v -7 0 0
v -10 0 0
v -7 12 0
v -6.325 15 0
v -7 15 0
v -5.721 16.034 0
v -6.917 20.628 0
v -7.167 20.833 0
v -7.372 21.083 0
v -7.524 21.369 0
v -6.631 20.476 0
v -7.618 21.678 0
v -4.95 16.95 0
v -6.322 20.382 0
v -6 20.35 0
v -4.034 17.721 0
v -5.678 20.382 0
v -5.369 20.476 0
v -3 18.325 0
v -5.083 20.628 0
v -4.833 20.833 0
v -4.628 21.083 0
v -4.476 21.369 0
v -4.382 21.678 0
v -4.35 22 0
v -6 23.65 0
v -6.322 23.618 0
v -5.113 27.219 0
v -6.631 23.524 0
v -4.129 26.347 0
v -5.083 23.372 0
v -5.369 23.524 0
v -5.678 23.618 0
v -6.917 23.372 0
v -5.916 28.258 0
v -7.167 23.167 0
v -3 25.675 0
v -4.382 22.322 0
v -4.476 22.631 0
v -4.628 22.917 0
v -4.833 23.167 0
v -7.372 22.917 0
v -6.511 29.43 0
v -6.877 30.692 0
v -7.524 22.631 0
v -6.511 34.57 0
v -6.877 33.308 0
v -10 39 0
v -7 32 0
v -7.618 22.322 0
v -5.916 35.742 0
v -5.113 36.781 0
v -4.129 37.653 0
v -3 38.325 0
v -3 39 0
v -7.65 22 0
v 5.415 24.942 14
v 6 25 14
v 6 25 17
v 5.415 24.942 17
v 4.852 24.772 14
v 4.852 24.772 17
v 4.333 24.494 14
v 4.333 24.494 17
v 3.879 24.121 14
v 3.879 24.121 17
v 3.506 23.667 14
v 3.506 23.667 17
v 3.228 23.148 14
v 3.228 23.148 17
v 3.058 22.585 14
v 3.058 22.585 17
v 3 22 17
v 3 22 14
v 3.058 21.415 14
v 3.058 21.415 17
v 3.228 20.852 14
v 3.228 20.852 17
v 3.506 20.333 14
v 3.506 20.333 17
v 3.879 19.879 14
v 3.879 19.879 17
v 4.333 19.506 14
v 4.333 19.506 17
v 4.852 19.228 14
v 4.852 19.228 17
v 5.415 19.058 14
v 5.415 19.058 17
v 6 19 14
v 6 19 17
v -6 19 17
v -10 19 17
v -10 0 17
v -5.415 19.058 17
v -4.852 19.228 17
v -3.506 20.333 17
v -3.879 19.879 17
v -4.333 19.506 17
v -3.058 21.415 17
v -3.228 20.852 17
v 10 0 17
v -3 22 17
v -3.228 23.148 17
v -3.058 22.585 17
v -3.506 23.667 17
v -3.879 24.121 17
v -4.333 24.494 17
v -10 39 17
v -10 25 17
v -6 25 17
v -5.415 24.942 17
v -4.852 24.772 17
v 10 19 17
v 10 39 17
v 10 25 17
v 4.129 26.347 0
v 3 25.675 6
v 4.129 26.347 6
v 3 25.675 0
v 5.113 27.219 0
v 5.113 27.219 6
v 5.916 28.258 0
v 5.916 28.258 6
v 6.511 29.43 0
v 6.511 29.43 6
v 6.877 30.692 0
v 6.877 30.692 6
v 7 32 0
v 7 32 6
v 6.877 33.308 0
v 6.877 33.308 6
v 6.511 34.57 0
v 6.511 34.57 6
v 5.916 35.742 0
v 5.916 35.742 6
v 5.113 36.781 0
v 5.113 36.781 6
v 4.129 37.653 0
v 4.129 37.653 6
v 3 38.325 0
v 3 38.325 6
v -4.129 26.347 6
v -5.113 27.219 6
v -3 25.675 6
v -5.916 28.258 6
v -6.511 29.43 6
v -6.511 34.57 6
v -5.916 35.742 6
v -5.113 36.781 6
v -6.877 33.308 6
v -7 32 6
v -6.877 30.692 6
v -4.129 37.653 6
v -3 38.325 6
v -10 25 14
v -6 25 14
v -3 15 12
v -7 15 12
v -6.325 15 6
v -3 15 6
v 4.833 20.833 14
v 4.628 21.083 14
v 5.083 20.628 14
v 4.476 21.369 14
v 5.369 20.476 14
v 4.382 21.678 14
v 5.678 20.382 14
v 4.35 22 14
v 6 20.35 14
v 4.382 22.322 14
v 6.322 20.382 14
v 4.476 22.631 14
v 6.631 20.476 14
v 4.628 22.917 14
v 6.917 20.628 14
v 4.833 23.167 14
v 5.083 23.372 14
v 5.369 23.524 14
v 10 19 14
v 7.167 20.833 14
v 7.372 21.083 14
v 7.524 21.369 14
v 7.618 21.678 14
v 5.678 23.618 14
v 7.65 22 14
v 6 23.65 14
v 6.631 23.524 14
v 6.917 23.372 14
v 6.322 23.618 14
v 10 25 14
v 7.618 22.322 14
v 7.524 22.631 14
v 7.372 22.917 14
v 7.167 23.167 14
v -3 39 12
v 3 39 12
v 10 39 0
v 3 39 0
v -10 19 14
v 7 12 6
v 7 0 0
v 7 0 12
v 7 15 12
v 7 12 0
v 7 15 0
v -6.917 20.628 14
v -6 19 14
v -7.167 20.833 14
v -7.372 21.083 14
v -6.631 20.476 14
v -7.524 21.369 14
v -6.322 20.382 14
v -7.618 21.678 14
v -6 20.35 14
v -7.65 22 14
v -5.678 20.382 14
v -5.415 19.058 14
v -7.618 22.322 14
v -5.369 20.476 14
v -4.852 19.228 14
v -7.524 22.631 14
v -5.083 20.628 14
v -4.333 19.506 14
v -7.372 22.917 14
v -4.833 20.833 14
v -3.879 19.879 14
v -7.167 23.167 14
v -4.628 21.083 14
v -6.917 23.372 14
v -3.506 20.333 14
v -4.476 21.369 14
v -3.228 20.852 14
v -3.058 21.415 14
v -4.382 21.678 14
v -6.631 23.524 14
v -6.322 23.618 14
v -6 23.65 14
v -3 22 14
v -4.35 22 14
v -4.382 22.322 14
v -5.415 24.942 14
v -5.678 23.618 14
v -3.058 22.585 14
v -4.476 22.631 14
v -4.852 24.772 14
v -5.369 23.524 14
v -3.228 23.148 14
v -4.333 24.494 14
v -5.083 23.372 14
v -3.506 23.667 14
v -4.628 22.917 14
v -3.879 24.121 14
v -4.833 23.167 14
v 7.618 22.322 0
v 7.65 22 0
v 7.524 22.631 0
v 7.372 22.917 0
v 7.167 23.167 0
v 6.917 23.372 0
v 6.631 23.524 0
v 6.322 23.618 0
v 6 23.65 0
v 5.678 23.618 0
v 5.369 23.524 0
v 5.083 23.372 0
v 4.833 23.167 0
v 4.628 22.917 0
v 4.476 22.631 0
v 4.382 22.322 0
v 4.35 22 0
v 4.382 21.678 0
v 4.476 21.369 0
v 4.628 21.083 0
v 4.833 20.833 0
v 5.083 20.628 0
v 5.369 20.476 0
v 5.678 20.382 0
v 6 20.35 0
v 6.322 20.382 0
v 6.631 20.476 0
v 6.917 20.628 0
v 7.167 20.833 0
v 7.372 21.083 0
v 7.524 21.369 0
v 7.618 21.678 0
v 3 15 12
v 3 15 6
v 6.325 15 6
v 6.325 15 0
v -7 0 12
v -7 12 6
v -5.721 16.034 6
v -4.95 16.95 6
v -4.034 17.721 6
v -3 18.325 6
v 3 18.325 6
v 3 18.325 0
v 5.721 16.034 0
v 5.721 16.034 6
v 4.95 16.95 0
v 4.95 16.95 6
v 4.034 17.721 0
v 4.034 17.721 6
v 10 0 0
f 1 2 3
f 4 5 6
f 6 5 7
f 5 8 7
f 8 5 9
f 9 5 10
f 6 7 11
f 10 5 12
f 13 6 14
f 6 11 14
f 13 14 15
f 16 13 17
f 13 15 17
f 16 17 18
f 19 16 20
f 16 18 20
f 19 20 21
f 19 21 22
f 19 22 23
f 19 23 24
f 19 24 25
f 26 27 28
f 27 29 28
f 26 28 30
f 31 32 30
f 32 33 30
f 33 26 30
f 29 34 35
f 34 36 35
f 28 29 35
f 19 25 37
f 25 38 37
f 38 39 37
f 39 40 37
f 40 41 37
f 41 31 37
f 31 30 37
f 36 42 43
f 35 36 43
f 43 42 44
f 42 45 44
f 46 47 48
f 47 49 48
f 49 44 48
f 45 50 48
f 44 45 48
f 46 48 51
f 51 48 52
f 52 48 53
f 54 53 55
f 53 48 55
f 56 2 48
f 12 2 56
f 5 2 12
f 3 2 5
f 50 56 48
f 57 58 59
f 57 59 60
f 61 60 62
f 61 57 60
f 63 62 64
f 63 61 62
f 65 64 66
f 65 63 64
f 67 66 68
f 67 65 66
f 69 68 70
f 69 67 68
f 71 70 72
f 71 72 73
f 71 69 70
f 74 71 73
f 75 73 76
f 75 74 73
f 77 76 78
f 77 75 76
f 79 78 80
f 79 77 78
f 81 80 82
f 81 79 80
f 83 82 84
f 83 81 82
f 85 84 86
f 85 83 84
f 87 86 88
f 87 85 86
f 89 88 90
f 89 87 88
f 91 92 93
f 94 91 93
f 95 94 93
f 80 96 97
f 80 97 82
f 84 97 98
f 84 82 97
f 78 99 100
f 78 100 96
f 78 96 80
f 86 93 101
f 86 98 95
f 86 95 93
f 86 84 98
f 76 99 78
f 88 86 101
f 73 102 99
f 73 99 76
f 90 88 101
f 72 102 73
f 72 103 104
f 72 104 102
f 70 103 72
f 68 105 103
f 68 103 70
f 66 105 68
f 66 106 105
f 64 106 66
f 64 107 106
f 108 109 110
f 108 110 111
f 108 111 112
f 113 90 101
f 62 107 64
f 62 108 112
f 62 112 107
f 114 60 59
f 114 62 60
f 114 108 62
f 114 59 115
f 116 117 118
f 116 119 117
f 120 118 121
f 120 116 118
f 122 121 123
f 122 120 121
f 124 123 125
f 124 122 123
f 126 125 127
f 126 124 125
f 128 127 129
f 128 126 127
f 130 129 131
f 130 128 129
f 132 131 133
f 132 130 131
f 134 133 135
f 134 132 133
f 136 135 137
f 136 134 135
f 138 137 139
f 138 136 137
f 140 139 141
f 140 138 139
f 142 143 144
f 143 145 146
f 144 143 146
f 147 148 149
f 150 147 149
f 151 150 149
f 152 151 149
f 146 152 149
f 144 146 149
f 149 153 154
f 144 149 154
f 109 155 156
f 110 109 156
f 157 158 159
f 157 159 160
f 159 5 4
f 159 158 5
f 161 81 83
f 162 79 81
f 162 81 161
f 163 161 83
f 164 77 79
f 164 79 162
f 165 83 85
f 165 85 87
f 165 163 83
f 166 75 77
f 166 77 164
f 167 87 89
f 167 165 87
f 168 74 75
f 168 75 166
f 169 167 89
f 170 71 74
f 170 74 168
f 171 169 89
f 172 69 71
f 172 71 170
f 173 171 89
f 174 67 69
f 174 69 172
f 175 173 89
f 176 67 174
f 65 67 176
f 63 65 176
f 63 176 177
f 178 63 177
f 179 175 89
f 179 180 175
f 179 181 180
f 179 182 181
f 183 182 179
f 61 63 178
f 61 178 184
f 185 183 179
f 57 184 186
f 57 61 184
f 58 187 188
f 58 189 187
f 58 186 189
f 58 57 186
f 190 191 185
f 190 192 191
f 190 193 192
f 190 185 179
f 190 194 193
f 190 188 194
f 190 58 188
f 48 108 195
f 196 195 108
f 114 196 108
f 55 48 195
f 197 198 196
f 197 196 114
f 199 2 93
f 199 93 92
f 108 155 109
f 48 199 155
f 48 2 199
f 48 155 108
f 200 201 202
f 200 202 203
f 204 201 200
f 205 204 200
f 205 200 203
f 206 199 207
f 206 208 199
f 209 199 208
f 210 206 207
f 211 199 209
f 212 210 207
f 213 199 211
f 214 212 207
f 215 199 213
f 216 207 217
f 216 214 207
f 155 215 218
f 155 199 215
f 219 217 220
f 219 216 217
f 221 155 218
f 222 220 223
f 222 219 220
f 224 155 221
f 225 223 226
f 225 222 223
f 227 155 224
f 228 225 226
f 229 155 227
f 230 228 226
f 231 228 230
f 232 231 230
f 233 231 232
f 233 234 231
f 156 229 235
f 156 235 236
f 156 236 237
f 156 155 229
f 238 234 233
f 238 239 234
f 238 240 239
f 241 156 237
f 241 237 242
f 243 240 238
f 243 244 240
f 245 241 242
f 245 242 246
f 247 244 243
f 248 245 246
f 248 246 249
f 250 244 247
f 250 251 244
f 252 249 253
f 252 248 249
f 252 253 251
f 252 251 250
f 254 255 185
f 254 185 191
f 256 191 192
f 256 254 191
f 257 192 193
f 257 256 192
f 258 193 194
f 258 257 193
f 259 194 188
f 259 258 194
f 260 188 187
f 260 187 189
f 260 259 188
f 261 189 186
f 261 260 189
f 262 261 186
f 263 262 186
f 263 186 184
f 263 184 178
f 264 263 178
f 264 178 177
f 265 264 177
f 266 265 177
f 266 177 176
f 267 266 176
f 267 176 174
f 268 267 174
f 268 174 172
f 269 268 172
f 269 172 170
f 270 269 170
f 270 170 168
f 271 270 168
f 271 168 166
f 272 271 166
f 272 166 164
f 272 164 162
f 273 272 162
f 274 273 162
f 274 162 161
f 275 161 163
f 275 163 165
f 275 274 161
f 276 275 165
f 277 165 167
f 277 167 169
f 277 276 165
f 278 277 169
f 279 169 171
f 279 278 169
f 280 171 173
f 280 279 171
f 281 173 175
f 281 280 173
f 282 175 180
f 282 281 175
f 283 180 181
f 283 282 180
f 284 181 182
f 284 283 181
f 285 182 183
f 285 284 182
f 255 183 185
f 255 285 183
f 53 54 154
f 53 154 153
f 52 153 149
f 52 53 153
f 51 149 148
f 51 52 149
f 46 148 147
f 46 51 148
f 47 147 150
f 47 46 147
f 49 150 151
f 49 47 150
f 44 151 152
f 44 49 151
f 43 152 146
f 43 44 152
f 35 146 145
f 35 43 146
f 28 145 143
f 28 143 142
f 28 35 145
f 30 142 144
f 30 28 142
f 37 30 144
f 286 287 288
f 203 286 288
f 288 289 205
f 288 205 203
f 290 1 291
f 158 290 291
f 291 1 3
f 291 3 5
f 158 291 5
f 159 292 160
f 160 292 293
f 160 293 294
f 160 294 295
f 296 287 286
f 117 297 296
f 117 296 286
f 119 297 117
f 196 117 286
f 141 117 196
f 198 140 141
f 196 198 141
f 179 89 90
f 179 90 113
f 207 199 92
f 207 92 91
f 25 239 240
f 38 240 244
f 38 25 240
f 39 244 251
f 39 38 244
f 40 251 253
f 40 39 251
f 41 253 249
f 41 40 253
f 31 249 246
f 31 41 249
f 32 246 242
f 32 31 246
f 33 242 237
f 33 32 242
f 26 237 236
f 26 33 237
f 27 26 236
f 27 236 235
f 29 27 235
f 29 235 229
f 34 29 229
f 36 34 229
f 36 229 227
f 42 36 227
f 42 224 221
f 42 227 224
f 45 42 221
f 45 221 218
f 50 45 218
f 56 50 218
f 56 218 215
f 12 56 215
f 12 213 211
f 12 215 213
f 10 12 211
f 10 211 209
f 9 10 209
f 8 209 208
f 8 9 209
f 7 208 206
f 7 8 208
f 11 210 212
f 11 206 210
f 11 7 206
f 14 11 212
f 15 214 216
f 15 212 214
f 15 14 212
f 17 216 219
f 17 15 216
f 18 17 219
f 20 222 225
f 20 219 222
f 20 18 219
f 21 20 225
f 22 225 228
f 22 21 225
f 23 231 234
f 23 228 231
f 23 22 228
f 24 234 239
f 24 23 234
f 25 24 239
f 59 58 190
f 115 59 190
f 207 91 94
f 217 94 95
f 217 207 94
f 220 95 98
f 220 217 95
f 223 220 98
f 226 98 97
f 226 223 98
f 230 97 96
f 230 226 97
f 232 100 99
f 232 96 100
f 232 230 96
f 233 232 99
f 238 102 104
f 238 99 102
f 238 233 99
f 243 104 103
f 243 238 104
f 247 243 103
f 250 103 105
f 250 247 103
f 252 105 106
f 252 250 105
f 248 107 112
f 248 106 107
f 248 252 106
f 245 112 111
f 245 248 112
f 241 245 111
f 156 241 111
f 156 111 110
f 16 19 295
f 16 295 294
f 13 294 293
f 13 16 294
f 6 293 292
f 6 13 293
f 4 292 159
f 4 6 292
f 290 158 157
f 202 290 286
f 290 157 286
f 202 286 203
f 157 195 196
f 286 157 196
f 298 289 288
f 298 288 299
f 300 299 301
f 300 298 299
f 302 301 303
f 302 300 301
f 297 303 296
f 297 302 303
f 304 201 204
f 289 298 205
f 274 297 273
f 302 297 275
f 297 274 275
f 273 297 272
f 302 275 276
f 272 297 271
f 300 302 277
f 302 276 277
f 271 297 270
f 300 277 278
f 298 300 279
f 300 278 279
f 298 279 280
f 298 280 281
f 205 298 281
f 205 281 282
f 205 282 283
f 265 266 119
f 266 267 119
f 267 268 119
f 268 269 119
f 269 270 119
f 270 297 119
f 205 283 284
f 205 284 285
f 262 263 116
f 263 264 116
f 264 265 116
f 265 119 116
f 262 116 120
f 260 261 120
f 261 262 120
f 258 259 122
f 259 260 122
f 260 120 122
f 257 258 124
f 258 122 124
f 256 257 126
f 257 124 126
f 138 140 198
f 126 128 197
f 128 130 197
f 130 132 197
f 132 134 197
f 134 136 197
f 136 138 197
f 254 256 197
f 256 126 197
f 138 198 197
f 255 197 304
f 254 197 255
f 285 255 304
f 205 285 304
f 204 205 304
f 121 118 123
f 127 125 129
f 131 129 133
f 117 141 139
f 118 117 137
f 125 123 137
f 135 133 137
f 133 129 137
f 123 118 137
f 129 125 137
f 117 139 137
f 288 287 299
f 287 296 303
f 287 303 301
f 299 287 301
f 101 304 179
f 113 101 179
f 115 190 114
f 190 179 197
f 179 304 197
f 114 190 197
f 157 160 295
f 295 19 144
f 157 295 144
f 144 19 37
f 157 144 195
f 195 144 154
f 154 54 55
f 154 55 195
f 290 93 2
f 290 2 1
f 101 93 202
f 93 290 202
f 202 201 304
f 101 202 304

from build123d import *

# Parameters (mm, degrees)
CYLINDER005_R     = 3
CYLINDER005_DEPTH = 3
CYLINDER006_R     = 3
CYLINDER006_DEPTH = 3
BOX004_W          = 10
BOX004_H          = 6
BOX004_DEPTH      = 10
BOX005_W          = 10
BOX005_H          = 6
BOX005_DEPTH      = 10
CYLINDER010_R     = 1.65
CYLINDER010_DEPTH = 42
CYLINDER009_R     = 1.65
CYLINDER009_DEPTH = 42
BOX006_W          = 6
BOX006_H          = 32
BOX006_DEPTH      = 12
CYLINDER007_R     = 7
CYLINDER007_DEPTH = 6
CYLINDER008_R     = 7
CYLINDER008_DEPTH = 6
BOX001_W          = 20
BOX001_H          = 24
BOX001_DEPTH      = 17
BOX_W             = 20
BOX_H             = 15
BOX_DEPTH         = 5
BOX003_W          = 3
BOX003_H          = 39
BOX003_DEPTH      = 17
BOX007_W          = 3
BOX007_H          = 39
BOX007_DEPTH      = 17


with BuildPart() as cylinder005:
    # Cylinder005 → Cylinder005 (new body)
    with BuildSketch(Plane(origin=(6, 22, 0), x_dir=(1, 0, 0), z_dir=(0, 0, 1))):
        Circle(CYLINDER005_R)
    extrude(amount=CYLINDER005_DEPTH)


with BuildPart() as fusion001001001004:
    # Cylinder006 → Cylinder006 (new body)
    with BuildSketch(Plane(origin=(-6, 22, 0), x_dir=(1, 0, 0), z_dir=(0, 0, 1))):
        Circle(CYLINDER006_R)
    extrude(amount=CYLINDER006_DEPTH)

    # Fusion001001001004: union Cylinder005
    add(cylinder005.part)


with BuildPart() as fusion001001001004_1:
    # Fusion001001001004 placement: moved
    add(fusion001001001004.part.moved(Location((0, 0, 14))))


with BuildPart() as cube004:
    # Box004 → Box004 (new body)
    with BuildSketch(Plane(origin=(6, 19, 14), x_dir=(1, 0, 0), z_dir=(0, 0, 1))):
        with Locations((5, 3)):
            Rectangle(BOX004_W, BOX004_H)
    extrude(amount=BOX004_DEPTH)


with BuildPart() as fusion001001001005:
    # Box005 → Box005 (new body)
    with BuildSketch(Plane(origin=(-16, 19, 14), x_dir=(1, 0, 0), z_dir=(0, 0, 1))):
        with Locations((5, 3)):
            Rectangle(BOX005_W, BOX005_H)
    extrude(amount=BOX005_DEPTH)

    # Fusion001001001005: union Cube004
    add(cube004.part)


with BuildPart() as cylinder010:
    # Cylinder010 → Cylinder010 (new body)
    with BuildSketch(Plane(origin=(-6, 22, 0), x_dir=(1, 0, 0), z_dir=(0, 0, 1))):
        Circle(CYLINDER010_R)
    extrude(amount=CYLINDER010_DEPTH)


with BuildPart() as fusion001001001003:
    # Cylinder009 → Cylinder009 (new body)
    with BuildSketch(Plane(origin=(6, 22, 0), x_dir=(1, 0, 0), z_dir=(0, 0, 1))):
        Circle(CYLINDER009_R)
    extrude(amount=CYLINDER009_DEPTH)

    # Fusion001001001003: union Cylinder010
    add(cylinder010.part)


with BuildPart() as cube006:
    # Box006 → Box006 (new body)
    with BuildSketch(Plane(origin=(-3, 13, 0), x_dir=(1, 0, 0), z_dir=(0, 0, 1))):
        with Locations((3, 16)):
            Rectangle(BOX006_W, BOX006_H)
    extrude(amount=BOX006_DEPTH)


with BuildPart() as cylinder007:
    # Cylinder007 → Cylinder007 (new body)
    with BuildSketch(Plane(origin=(0, 32, 0), x_dir=(1, 0, 0), z_dir=(0, 0, 1))):
        Circle(CYLINDER007_R)
    extrude(amount=CYLINDER007_DEPTH)


with BuildPart() as fusion:
    # Cylinder008 → Cylinder008 (new body)
    with BuildSketch(Plane(origin=(0, 12, 0), x_dir=(1, 0, 0), z_dir=(0, 0, 1))):
        Circle(CYLINDER008_R)
    extrude(amount=CYLINDER008_DEPTH)

    # Fusion: union Cylinder007
    add(cylinder007.part)


with BuildPart() as cube001:
    # Box001 → Box001 (new body)
    with BuildSketch(Plane(origin=(-10, 15, 0), x_dir=(1, 0, 0), z_dir=(0, 0, 1))):
        with Locations((10, 12)):
            Rectangle(BOX001_W, BOX001_H)
    extrude(amount=BOX001_DEPTH)


with BuildPart() as cube:
    # Box → Box (new body)
    with BuildSketch(Plane(origin=(-10, 0, 12), x_dir=(1, 0, 0), z_dir=(0, 0, 1))):
        with Locations((10, 7.5)):
            Rectangle(BOX_W, BOX_H)
    extrude(amount=BOX_DEPTH)


with BuildPart() as cube003:
    # Box003 → Box003 (new body)
    with BuildSketch(Plane(origin=(-10, 0, 0), x_dir=(1, 0, 0), z_dir=(0, 0, 1))):
        with Locations((1.5, 19.5)):
            Rectangle(BOX003_W, BOX003_H)
    extrude(amount=BOX003_DEPTH)


with BuildPart() as base_endstop_mount_template:
    # Box007 → Box007 (new body)
    with BuildSketch(Plane(origin=(7, 0, 0), x_dir=(1, 0, 0), z_dir=(0, 0, 1))):
        with Locations((1.5, 19.5)):
            Rectangle(BOX007_W, BOX007_H)
    extrude(amount=BOX007_DEPTH)

    # Fusion001001001008: union Cube001, Cube, Cube003
    add(cube001.part)
    add(cube.part)
    add(cube003.part)

    # Cut002008023012009006003002002: cut Fusion
    add(fusion.part, mode=Mode.SUBTRACT)

    # Cut002008023012009006003002003: cut Cube006
    add(cube006.part, mode=Mode.SUBTRACT)

    # Cut002008023012009006003002004: cut Fusion001001001003
    add(fusion001001001003.part, mode=Mode.SUBTRACT)

    # Cut002008023012009006003002005: cut Fusion001001001005
    add(fusion001001001005.part, mode=Mode.SUBTRACT)

    # Cut002008023012009006003002006: cut Fusion001001001004
    add(fusion001001001004_1.part, mode=Mode.SUBTRACT)


solid = base_endstop_mount_template.part
